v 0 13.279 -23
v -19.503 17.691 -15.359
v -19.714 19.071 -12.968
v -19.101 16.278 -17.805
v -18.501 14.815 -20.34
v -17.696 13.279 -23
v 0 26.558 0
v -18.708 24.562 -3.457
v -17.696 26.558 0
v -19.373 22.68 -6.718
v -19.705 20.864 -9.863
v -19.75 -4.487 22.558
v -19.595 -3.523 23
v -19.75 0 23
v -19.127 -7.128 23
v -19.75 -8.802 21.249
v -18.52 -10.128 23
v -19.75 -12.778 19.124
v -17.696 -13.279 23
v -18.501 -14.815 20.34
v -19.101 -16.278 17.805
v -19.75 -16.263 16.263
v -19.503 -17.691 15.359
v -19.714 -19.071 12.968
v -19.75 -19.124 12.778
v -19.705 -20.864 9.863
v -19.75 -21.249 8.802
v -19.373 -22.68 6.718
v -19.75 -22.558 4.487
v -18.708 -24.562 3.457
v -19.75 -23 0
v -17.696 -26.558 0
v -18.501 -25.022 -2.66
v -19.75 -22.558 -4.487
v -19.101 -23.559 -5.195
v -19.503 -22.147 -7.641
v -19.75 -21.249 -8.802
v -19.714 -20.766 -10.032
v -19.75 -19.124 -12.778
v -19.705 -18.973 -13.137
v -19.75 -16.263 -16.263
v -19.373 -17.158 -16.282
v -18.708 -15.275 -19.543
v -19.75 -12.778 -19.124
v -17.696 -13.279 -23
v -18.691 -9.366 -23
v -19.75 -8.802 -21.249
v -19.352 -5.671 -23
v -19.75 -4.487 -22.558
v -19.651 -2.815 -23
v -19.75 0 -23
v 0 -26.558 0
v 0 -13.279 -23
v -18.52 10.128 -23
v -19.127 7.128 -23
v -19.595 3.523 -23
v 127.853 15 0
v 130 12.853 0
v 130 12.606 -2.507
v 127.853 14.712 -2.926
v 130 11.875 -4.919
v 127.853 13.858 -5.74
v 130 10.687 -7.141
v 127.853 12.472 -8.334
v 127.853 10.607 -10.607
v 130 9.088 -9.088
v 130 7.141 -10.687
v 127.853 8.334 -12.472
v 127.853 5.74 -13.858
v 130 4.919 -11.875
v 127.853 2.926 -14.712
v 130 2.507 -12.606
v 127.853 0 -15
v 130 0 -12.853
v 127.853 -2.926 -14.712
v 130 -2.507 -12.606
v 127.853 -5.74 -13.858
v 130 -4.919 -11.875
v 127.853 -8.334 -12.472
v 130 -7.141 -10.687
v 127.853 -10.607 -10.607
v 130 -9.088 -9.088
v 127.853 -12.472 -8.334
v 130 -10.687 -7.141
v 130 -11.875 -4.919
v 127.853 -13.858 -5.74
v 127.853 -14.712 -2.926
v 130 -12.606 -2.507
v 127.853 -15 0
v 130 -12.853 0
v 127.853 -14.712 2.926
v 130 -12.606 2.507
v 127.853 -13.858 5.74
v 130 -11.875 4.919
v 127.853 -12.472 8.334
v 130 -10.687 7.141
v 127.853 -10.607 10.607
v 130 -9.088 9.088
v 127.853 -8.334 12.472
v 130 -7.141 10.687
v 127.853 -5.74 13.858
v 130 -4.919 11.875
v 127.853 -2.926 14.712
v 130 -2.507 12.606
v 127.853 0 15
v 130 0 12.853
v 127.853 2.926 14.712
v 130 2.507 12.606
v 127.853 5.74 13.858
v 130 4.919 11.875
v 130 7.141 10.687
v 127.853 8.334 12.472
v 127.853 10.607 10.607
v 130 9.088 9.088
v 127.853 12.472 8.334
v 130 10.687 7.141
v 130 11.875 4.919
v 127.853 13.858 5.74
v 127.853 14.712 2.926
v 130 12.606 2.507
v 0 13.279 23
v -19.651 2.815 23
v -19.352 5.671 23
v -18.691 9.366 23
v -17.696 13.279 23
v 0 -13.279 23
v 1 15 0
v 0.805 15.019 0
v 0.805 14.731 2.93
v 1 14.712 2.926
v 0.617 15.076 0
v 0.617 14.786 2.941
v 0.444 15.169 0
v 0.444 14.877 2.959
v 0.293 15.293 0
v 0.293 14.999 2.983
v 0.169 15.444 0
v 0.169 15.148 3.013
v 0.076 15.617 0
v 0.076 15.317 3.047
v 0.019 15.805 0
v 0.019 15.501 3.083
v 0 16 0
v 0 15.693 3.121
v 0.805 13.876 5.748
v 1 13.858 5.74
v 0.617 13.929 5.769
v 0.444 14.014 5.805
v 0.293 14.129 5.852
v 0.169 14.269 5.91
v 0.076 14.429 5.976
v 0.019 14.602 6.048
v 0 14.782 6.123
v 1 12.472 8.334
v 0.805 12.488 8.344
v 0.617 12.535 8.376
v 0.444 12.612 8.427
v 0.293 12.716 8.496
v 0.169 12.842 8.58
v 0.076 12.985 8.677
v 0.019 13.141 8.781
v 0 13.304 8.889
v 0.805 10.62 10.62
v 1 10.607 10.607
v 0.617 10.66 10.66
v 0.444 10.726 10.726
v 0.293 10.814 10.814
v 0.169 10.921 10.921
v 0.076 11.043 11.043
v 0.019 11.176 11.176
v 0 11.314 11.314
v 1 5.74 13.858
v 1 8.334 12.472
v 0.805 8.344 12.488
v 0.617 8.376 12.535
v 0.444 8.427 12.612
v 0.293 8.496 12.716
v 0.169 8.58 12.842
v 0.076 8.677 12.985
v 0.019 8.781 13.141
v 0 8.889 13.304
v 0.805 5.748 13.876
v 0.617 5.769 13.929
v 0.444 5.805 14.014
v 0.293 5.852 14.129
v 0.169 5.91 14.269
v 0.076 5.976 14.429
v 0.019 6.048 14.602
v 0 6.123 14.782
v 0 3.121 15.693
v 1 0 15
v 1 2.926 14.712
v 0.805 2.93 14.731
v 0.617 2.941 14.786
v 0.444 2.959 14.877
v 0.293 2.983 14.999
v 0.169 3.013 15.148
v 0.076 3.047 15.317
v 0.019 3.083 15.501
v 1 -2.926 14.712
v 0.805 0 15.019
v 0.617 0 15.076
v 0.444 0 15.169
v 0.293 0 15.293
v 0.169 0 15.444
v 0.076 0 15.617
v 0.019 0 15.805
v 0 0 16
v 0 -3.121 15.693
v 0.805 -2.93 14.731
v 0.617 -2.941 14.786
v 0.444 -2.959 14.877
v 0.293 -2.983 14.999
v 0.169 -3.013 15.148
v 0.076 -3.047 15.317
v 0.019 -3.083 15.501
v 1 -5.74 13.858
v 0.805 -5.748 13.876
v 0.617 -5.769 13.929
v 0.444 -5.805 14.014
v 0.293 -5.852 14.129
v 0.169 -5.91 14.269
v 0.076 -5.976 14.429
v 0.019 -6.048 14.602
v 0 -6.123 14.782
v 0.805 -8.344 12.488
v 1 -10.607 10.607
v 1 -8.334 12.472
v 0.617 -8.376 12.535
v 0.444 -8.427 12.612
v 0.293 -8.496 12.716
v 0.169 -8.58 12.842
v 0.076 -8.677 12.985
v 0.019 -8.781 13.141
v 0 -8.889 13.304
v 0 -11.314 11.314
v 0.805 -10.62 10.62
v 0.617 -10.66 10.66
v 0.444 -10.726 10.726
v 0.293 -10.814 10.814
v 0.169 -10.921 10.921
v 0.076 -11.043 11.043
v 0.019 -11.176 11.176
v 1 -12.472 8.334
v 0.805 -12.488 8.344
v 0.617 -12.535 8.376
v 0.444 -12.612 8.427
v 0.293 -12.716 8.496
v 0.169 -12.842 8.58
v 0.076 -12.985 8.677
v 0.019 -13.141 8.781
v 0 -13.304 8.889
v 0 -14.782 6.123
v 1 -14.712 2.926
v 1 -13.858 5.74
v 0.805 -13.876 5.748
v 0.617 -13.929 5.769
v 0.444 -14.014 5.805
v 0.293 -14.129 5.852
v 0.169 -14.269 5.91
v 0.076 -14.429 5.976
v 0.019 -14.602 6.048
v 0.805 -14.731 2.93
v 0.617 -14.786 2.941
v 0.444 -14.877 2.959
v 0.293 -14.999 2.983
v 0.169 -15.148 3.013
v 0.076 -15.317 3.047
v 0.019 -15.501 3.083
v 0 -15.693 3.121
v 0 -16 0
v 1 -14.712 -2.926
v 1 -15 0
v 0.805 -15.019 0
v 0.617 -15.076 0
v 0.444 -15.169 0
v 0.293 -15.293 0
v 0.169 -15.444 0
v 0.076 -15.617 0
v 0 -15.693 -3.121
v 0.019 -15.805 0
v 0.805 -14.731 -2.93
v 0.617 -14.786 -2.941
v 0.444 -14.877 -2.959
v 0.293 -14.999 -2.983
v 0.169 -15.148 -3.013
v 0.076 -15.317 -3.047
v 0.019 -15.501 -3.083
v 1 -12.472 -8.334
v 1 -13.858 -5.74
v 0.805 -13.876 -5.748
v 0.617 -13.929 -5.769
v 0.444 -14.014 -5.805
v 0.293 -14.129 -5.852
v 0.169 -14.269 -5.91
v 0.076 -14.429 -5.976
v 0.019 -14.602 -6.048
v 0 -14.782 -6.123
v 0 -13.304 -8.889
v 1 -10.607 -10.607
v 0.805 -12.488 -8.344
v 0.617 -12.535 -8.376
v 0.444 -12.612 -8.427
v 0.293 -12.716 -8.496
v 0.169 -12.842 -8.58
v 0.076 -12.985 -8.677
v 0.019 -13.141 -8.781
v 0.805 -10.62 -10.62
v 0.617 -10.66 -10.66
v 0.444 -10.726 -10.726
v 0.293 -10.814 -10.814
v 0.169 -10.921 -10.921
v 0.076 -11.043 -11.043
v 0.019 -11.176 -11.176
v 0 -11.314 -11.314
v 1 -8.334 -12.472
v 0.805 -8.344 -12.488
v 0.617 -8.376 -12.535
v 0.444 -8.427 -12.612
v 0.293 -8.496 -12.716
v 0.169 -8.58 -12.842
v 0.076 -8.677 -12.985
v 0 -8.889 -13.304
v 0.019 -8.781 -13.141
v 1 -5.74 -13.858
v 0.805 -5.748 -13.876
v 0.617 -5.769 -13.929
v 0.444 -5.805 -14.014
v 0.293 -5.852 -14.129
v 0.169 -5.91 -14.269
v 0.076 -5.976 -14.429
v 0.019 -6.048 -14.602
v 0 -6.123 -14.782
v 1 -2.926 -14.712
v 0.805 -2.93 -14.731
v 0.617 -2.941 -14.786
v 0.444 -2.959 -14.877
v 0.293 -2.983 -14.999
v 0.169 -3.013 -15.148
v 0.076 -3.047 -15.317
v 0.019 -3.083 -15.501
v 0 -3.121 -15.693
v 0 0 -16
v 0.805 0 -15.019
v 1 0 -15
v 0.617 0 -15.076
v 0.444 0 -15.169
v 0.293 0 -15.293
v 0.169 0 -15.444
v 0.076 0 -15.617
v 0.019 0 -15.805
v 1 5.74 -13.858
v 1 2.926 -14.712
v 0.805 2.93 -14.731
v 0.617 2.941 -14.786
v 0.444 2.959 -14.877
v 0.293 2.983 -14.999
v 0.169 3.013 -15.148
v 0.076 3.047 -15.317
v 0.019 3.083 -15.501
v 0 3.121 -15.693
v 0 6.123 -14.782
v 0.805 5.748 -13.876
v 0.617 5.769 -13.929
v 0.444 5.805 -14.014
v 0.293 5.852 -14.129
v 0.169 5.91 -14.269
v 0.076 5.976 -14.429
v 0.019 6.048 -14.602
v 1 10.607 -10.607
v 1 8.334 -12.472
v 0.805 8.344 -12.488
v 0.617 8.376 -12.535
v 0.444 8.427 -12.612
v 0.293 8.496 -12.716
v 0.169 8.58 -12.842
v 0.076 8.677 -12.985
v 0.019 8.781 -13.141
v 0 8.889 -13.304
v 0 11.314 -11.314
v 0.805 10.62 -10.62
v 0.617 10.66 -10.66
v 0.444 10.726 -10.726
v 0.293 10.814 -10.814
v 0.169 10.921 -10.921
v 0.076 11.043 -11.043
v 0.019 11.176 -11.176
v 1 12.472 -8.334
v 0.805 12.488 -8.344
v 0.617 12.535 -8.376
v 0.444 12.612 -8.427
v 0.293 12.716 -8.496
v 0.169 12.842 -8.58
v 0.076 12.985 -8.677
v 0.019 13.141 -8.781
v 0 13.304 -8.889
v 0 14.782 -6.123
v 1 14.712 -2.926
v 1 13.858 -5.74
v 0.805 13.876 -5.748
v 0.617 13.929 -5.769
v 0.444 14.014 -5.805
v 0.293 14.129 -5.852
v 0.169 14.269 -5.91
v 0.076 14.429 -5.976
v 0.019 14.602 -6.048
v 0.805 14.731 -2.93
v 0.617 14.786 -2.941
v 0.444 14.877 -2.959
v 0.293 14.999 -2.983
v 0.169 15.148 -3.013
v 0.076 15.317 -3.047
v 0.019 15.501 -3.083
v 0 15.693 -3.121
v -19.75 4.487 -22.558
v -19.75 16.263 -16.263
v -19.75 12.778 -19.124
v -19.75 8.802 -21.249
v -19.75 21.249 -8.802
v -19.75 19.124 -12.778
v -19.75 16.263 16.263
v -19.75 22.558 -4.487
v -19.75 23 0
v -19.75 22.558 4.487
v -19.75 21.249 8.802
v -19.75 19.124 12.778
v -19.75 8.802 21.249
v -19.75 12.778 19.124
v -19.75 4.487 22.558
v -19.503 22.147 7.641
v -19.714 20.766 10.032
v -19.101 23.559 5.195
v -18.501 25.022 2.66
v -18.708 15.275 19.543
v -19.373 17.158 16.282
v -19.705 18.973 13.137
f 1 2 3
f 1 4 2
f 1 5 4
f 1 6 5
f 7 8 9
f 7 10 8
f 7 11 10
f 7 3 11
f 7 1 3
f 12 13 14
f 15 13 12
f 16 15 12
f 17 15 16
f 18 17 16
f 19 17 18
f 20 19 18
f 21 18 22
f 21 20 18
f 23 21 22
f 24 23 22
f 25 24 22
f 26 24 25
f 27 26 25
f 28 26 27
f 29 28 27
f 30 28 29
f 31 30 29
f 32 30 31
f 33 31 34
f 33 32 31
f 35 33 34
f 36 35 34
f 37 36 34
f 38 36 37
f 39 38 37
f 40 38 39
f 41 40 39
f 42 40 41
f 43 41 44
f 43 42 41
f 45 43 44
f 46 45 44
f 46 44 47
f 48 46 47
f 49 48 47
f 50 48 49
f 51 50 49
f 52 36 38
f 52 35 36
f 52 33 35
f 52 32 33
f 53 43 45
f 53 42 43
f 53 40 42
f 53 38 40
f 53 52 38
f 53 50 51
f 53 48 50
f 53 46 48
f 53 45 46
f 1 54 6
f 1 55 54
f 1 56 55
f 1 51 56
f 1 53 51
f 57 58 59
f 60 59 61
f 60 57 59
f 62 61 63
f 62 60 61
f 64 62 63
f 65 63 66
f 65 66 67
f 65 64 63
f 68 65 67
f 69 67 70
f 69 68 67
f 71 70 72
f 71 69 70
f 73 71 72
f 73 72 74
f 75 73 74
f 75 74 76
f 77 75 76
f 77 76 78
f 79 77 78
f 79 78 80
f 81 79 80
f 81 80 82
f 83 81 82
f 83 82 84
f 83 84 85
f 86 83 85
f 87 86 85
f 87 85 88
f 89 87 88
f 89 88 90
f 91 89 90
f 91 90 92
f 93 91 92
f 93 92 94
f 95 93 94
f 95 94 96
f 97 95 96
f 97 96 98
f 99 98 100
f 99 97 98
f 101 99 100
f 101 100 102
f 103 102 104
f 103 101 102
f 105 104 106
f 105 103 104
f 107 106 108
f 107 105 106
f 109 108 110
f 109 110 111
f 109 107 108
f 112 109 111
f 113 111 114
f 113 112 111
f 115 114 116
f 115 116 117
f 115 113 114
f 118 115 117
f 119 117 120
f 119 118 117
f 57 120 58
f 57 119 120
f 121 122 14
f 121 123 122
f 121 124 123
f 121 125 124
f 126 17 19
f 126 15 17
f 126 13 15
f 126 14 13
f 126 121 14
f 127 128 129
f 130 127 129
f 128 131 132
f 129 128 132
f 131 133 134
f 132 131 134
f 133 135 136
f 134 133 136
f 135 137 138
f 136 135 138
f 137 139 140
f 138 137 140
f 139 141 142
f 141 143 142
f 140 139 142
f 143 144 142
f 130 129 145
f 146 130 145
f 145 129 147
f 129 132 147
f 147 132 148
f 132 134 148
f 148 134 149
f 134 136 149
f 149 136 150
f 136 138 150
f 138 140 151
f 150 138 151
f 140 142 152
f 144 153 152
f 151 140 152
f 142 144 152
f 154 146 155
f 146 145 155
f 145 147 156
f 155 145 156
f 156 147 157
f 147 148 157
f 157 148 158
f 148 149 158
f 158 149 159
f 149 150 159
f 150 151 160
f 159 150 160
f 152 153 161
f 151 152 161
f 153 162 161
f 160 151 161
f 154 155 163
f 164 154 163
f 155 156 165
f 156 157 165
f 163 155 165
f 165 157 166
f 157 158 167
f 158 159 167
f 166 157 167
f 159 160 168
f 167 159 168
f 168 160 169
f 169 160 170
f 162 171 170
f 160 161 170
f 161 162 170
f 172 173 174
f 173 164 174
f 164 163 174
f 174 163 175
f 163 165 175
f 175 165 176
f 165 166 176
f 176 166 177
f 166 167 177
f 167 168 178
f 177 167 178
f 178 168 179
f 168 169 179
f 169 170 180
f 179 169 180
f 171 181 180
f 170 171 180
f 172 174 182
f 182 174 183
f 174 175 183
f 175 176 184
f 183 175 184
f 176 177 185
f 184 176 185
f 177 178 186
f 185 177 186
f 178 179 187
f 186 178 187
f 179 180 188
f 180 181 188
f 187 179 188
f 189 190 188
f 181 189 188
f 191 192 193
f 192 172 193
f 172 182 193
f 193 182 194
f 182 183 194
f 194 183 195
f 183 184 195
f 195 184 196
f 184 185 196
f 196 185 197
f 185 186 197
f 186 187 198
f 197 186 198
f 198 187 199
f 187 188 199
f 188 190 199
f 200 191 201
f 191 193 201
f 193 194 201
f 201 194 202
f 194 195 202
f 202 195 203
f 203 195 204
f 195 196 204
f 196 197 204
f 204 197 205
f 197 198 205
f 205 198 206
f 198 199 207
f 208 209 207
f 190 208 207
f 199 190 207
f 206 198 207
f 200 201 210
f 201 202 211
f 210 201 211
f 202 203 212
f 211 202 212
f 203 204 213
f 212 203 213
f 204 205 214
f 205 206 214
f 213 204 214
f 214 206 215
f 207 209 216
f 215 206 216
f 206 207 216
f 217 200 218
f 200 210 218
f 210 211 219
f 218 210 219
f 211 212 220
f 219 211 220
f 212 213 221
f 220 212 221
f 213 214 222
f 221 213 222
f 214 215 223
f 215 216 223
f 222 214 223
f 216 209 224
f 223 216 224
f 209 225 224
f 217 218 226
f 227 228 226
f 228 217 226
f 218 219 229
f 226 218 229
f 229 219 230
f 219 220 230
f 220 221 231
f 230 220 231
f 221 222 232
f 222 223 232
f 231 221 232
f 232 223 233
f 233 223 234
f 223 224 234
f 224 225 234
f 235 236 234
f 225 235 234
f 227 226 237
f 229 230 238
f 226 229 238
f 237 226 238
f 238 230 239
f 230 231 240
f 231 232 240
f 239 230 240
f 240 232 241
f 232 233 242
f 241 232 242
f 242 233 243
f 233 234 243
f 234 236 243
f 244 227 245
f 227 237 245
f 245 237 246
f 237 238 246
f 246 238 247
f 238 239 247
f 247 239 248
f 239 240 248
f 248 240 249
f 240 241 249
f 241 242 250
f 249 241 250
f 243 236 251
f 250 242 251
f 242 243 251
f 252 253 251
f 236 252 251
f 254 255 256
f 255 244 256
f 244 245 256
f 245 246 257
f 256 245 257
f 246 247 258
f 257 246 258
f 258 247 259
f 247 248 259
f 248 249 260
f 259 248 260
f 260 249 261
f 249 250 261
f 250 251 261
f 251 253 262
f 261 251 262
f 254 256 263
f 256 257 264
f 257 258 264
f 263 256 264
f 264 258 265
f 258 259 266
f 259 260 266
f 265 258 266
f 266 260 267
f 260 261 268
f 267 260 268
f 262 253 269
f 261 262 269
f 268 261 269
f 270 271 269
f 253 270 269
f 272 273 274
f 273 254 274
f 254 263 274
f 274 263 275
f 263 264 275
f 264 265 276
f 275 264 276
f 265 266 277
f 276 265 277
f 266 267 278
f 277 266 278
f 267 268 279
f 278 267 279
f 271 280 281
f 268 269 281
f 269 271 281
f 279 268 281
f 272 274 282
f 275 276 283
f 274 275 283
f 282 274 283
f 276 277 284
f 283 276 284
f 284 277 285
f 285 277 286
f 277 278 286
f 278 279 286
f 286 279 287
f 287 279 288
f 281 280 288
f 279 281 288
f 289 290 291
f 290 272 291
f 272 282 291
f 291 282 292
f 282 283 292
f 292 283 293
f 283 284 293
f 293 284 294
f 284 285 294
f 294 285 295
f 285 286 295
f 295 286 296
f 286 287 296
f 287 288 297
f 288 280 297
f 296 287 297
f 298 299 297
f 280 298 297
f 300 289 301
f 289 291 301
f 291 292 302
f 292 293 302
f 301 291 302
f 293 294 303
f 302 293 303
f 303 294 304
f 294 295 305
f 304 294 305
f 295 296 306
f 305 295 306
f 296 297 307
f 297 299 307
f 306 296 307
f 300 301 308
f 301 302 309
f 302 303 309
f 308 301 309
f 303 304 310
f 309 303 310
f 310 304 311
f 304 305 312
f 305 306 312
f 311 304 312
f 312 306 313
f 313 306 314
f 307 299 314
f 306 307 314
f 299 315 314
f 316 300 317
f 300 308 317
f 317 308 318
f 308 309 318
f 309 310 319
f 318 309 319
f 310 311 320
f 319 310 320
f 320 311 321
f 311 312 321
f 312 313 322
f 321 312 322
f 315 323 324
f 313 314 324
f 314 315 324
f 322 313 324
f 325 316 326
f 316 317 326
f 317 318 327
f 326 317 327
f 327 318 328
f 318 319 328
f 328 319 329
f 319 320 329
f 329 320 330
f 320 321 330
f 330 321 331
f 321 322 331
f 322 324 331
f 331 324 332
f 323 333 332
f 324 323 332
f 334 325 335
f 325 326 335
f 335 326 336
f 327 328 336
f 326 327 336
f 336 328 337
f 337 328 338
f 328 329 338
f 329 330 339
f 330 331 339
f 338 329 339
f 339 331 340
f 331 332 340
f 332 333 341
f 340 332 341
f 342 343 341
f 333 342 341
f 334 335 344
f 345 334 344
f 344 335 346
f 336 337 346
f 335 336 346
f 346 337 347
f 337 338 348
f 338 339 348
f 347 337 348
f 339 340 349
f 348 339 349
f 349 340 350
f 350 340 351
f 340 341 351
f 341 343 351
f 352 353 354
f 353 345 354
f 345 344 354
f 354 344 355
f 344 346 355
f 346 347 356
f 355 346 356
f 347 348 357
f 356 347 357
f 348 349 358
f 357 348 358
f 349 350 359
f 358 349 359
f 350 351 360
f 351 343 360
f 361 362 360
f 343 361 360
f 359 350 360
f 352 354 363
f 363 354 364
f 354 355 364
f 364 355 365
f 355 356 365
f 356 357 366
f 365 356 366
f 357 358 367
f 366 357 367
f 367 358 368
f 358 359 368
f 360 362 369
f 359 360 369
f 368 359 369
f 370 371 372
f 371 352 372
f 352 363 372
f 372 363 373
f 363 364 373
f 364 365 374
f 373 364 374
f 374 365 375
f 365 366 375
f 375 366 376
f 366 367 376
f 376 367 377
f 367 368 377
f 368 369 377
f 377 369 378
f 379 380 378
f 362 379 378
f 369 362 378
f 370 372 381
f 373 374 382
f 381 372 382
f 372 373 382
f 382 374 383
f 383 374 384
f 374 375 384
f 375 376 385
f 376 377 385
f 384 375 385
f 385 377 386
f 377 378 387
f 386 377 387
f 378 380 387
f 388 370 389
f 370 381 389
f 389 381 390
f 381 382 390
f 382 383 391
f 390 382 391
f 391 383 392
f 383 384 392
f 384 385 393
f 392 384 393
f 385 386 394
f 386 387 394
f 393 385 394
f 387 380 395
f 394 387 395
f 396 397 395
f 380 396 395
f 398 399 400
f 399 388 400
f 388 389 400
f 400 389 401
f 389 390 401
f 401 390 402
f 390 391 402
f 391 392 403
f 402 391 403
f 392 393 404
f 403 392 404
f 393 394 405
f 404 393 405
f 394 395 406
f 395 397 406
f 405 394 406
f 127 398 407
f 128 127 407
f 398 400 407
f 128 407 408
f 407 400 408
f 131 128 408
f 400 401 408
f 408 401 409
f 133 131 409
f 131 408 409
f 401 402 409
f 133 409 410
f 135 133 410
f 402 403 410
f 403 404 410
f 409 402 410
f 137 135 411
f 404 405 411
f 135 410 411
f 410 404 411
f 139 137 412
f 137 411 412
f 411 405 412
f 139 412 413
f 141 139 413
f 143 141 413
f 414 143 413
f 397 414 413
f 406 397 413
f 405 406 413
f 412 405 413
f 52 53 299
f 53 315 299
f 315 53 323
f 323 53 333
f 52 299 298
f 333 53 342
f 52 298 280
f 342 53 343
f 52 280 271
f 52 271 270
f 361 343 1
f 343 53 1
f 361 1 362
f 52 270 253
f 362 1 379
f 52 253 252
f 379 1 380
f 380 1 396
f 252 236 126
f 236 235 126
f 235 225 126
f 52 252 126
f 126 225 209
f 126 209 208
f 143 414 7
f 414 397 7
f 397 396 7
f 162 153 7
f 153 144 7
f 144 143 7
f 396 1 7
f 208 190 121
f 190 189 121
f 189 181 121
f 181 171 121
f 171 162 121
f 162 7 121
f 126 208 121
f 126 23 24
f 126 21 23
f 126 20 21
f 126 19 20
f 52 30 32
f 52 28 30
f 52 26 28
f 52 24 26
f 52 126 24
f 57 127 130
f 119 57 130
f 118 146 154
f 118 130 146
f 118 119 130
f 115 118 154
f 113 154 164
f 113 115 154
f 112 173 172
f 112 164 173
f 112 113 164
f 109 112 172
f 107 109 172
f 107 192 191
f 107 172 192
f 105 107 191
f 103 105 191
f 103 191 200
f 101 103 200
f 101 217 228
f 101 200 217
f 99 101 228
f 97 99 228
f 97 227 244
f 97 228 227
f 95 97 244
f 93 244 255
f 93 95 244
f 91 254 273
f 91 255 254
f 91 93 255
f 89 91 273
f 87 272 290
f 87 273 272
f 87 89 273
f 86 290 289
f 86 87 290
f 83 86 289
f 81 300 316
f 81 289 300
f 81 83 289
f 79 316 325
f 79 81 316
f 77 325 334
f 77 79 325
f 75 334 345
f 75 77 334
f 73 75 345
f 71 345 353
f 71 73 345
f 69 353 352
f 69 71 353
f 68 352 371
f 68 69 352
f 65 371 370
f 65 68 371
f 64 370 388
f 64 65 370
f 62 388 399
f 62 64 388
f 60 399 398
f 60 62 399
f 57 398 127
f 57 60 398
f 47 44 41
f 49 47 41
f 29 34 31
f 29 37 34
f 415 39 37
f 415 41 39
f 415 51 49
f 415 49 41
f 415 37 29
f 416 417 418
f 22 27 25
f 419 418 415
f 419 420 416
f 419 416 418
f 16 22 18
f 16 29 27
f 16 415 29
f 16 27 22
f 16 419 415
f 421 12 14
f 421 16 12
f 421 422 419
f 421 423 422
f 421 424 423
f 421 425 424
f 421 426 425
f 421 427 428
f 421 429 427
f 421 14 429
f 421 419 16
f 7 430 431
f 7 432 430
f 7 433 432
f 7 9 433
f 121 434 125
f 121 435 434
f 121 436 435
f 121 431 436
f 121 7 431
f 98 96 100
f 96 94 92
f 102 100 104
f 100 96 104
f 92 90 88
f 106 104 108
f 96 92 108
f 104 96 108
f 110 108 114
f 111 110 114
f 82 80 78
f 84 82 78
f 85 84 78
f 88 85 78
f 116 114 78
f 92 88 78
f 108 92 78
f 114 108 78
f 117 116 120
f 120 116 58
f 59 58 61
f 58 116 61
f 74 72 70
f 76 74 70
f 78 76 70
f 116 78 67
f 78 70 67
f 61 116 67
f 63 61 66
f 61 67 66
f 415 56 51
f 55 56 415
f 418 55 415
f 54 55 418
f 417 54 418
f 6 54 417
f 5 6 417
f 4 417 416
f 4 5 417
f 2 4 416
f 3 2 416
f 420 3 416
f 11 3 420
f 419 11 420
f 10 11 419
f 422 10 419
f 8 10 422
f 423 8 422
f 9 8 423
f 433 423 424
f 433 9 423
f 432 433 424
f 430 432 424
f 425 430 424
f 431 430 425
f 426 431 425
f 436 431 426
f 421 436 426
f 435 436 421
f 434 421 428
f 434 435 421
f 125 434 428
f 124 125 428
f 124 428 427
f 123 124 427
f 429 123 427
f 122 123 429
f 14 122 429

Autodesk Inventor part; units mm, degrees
ref_plane "YZ Plane" through (0, 0, 0) normal (1, 0, 0) x (0, 1, 0)
ref_plane "XZ Plane" through (0, 0, 0) normal (0, 1, 0) x (-1, 0, 0)
sketch "Sketch1" plane through (0, 0, 0) normal (0, 0, 1) x (1, 0, 0)
  line L0 (0, 15) -> (130, 15)
  line L1 (130, 15) -> (130, 0)
  line L2 (130, 0) -> (0, 0)
  line L3 (-26, 0) -> (156, 0) projected
  line L4 (0, -3) -> (0, 18) projected
  line L5 (0, 15) -> (0, 0)
  dimension "d2" = 30
  dimension "d59" = 130
revolve "Body" add sketch "Sketch1" angle 360 about axis through (130, 0, 0) along (-1, 0, 0)
sketch "Sketch2" plane through (0, 0, 0) normal (-1, 0, 0) x (0, 0, 1)
  line L0 (0, 26.5581) -> (23, 13.2791)
  line L1 (23, 13.2791) -> (23, -13.2791)
  line L2 (23, -13.2791) -> (0, -26.5581)
  line L3 (0, -26.5581) -> (-23, -13.2791)
  line L4 (-23, -13.2791) -> (-23, 13.2791)
  line L5 (-23, 13.2791) -> (0, 26.5581)
  line L6 (-32.2, 0) -> (32.2, 0) projected
  line L7 (0, 37.1814) -> (0, -37.1814) projected
  point P0 (0, 0)
  point P1 (0, 0)
  dimension "d11" = 46
extrude "Head" add sketch "Sketch2" along normal blind 19.75
sketch "Sketch4" plane through (0, 0, 0) normal (0, 0, 1) x (1, 0, 0)
  line L0 (-17.0942, 27.6) -> (-19.75, 23)
  line L1 (-1.1, 0) -> (-0.234, 0)
  line L2 (-23.6532, 0) -> (3.6692, 0) projected
  line L3 (-19.75, 27.6) -> (-17.0942, 27.6)
  line L4 (-19.75, 23) -> (-19.75, 27.6)
  line L5 (0, 33.12) -> (0, -5.52) projected
  dimension "d65" = 46
  dimension "d67" = 30
  dimension "d68" = 55.2
  dimension "d69" = 19.75
revolve "Chamfer1" cut sketch "Sketch4" angle 360 about axis through (-1.1, 0, 0) along (1, 0, 0)
thread "Thread" size "M30x3.5" class "6g" standard "ISO Metric profile" length 72
chamfer "Chamfer2" distance 2.1471 distance2 2.1472 1 edges at (130, -15, 0) measured on face at (130, -3.9999, -1.1966)
fillet "Fillet" radius 1 1 edges at (0, -15, 0)
ref_plane "Work Plane1" through (1.525, 0, 0) normal (0, 0, 1) x (1, 0, 0)
equation "\"d2\" = GD"
equation "\"d59\" = NLG"
equation "\"d11\" = SW"
equation "\"d3\" = KOH"
equation "\"d15\" = GEL"
equation "\"d6\" = -0.5 * SPD + 0.5 * GD"
equation "\"d71\" = RR1"
equation "\"d65\" = SW"
equation "\"d67\" = ANG1"
equation "\"d68\" = 1.2 * SW"
equation "\"d69\" = KOH"
equation "\"NLG\" = 130"
equation "\"GD\" = NND"
equation "\"KOH\" = 19.75"
equation "\"GEL\" = 72"
equation "\"SW\" = 46"
equation "\"SW0\" = SW"
equation "\"SPD\" = NND - 1.2269 * PTC"
equation "\"SD\" = 0"
equation "\"ANG1\" = 30deg"
equation "\"GAL\" = 0.61345 * PTC"
equation "\"GUL\" = 0.61345 * PTC"
equation "\"RR\" = 0.1"
equation "\"RR1\" = 1"
equation "\"GD1\" = THREADDIA - 1.2269 * PTC"
equation "\"TOA\" = 30deg"
equation "\"PTC\" = 3.5"
equation "\"KOH1\" = 13.1"
equation "\"E0\" = 1.155 * SW"
equation "\"NND\" = 30"
equation "\"THREADDIA\" = 30"
properties part number "ANSI B18.2.3.5M - M30 x 3,5 x 130" material "Steel, Mild"
